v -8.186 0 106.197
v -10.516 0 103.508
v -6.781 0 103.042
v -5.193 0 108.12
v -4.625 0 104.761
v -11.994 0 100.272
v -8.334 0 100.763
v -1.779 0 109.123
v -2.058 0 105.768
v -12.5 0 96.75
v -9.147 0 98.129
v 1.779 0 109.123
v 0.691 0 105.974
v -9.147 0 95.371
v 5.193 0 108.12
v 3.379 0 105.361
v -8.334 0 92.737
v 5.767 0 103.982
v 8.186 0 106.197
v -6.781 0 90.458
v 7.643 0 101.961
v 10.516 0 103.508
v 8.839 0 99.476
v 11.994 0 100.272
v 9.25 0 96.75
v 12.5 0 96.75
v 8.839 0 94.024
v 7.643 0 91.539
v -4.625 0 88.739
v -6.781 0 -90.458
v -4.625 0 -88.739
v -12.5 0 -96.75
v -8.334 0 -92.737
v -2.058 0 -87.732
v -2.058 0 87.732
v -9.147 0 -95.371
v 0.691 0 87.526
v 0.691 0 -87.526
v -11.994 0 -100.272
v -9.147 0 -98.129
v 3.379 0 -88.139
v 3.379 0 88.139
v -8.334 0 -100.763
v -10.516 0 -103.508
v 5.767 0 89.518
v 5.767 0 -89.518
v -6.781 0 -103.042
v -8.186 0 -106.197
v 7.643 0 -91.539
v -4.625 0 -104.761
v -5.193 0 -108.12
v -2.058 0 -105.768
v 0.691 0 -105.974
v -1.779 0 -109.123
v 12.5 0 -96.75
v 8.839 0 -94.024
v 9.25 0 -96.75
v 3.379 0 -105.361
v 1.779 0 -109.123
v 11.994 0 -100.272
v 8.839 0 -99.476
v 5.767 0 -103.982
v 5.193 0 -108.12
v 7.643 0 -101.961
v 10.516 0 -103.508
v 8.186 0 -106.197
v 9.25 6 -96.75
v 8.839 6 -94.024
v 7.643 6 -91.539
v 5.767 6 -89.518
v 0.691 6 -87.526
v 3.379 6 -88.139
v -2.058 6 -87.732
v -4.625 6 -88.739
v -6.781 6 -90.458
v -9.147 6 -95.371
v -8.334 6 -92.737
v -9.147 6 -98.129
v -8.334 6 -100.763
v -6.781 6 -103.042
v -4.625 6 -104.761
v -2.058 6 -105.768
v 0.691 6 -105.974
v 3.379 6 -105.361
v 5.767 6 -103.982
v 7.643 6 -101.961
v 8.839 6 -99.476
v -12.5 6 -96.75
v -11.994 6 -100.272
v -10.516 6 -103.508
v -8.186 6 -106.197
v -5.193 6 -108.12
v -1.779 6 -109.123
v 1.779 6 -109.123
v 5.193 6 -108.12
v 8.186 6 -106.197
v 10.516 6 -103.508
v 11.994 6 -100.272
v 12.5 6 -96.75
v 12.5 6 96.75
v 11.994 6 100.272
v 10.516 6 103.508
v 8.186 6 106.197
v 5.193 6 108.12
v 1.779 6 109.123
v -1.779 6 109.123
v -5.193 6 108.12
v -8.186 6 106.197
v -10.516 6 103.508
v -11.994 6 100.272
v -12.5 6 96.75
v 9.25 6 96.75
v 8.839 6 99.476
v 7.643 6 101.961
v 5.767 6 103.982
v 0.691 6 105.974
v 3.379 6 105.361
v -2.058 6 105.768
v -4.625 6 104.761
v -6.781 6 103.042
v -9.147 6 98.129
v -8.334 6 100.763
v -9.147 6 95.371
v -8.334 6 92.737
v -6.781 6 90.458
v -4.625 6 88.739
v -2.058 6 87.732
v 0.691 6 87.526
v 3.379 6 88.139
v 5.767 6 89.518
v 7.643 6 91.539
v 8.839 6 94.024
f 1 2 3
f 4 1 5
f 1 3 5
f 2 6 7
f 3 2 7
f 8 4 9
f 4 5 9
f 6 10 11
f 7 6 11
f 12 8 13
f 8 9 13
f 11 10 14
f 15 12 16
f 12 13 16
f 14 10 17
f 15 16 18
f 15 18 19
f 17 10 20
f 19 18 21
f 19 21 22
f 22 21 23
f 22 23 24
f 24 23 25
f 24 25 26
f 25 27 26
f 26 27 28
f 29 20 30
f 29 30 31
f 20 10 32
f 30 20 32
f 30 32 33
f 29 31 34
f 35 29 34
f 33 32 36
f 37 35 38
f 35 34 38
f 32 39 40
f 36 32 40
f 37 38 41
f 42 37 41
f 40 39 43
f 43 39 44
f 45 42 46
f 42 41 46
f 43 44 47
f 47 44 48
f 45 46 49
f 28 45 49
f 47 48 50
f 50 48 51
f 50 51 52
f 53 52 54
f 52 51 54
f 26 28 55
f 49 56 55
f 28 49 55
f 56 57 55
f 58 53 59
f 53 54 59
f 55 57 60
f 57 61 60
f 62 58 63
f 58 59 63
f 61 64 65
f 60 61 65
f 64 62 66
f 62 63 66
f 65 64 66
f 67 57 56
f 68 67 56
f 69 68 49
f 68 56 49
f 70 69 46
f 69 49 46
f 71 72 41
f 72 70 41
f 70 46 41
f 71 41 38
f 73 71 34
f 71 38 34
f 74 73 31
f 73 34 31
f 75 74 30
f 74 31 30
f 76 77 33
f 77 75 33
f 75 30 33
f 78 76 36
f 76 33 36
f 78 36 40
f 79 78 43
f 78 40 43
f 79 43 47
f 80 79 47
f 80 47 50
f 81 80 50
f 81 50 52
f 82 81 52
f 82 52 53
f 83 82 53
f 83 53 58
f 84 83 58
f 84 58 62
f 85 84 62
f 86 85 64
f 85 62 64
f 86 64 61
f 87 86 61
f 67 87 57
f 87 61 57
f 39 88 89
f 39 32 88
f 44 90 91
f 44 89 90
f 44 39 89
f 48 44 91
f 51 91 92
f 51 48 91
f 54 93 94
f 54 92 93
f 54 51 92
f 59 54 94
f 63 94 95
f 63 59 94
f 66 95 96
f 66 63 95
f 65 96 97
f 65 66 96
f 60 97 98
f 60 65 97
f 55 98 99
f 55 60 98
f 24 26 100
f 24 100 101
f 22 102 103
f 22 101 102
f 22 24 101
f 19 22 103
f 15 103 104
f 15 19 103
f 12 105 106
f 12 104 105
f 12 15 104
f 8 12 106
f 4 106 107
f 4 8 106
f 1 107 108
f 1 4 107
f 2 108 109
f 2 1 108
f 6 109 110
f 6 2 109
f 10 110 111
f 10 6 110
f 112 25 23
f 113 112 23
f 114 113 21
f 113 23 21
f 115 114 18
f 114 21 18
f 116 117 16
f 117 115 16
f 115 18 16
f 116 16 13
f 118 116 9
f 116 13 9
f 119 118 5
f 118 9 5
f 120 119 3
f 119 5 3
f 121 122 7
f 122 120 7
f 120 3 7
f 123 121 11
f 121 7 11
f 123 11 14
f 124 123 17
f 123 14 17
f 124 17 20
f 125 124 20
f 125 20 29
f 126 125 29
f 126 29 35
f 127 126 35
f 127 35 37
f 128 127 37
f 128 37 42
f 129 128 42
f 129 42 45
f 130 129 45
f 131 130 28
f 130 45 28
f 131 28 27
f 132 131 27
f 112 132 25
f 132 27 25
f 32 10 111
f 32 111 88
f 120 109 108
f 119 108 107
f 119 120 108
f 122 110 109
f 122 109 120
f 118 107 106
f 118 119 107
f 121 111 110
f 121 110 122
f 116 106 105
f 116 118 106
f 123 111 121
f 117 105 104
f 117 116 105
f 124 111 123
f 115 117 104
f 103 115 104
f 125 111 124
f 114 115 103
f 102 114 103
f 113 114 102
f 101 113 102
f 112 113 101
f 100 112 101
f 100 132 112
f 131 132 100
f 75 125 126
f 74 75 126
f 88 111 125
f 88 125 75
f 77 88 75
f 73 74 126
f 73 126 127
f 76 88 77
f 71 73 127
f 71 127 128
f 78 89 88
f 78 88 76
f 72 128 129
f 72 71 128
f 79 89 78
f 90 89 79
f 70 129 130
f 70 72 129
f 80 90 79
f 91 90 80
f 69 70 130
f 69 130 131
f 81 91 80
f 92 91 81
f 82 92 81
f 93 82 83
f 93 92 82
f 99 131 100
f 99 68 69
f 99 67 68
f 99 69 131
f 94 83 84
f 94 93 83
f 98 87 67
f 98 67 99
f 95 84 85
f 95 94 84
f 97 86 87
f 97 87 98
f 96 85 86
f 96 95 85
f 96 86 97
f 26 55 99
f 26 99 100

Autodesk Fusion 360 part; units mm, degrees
sketch "Sketch1" plane through (0, 0, 0) normal (0, 1, 0) x (1, 0, 0)
  line L0 (-12.5, -96.75) -> (-12.5, 96.75)
  line L1 (12.5, 96.75) -> (12.5, -96.75)
  circle A0 centre (0, -96.75) radius 9.25
  arc A1 (-12.5, -96.75) -> (12.5, -96.75) centre (0, -96.75) ccw
  circle A2 centre (0, 96.75) radius 9.25
  arc A3 (12.5, 96.75) -> (-12.5, 96.75) centre (0, 96.75) ccw
extrude "Extrude1" add sketch "Sketch1" along normal blind 6
